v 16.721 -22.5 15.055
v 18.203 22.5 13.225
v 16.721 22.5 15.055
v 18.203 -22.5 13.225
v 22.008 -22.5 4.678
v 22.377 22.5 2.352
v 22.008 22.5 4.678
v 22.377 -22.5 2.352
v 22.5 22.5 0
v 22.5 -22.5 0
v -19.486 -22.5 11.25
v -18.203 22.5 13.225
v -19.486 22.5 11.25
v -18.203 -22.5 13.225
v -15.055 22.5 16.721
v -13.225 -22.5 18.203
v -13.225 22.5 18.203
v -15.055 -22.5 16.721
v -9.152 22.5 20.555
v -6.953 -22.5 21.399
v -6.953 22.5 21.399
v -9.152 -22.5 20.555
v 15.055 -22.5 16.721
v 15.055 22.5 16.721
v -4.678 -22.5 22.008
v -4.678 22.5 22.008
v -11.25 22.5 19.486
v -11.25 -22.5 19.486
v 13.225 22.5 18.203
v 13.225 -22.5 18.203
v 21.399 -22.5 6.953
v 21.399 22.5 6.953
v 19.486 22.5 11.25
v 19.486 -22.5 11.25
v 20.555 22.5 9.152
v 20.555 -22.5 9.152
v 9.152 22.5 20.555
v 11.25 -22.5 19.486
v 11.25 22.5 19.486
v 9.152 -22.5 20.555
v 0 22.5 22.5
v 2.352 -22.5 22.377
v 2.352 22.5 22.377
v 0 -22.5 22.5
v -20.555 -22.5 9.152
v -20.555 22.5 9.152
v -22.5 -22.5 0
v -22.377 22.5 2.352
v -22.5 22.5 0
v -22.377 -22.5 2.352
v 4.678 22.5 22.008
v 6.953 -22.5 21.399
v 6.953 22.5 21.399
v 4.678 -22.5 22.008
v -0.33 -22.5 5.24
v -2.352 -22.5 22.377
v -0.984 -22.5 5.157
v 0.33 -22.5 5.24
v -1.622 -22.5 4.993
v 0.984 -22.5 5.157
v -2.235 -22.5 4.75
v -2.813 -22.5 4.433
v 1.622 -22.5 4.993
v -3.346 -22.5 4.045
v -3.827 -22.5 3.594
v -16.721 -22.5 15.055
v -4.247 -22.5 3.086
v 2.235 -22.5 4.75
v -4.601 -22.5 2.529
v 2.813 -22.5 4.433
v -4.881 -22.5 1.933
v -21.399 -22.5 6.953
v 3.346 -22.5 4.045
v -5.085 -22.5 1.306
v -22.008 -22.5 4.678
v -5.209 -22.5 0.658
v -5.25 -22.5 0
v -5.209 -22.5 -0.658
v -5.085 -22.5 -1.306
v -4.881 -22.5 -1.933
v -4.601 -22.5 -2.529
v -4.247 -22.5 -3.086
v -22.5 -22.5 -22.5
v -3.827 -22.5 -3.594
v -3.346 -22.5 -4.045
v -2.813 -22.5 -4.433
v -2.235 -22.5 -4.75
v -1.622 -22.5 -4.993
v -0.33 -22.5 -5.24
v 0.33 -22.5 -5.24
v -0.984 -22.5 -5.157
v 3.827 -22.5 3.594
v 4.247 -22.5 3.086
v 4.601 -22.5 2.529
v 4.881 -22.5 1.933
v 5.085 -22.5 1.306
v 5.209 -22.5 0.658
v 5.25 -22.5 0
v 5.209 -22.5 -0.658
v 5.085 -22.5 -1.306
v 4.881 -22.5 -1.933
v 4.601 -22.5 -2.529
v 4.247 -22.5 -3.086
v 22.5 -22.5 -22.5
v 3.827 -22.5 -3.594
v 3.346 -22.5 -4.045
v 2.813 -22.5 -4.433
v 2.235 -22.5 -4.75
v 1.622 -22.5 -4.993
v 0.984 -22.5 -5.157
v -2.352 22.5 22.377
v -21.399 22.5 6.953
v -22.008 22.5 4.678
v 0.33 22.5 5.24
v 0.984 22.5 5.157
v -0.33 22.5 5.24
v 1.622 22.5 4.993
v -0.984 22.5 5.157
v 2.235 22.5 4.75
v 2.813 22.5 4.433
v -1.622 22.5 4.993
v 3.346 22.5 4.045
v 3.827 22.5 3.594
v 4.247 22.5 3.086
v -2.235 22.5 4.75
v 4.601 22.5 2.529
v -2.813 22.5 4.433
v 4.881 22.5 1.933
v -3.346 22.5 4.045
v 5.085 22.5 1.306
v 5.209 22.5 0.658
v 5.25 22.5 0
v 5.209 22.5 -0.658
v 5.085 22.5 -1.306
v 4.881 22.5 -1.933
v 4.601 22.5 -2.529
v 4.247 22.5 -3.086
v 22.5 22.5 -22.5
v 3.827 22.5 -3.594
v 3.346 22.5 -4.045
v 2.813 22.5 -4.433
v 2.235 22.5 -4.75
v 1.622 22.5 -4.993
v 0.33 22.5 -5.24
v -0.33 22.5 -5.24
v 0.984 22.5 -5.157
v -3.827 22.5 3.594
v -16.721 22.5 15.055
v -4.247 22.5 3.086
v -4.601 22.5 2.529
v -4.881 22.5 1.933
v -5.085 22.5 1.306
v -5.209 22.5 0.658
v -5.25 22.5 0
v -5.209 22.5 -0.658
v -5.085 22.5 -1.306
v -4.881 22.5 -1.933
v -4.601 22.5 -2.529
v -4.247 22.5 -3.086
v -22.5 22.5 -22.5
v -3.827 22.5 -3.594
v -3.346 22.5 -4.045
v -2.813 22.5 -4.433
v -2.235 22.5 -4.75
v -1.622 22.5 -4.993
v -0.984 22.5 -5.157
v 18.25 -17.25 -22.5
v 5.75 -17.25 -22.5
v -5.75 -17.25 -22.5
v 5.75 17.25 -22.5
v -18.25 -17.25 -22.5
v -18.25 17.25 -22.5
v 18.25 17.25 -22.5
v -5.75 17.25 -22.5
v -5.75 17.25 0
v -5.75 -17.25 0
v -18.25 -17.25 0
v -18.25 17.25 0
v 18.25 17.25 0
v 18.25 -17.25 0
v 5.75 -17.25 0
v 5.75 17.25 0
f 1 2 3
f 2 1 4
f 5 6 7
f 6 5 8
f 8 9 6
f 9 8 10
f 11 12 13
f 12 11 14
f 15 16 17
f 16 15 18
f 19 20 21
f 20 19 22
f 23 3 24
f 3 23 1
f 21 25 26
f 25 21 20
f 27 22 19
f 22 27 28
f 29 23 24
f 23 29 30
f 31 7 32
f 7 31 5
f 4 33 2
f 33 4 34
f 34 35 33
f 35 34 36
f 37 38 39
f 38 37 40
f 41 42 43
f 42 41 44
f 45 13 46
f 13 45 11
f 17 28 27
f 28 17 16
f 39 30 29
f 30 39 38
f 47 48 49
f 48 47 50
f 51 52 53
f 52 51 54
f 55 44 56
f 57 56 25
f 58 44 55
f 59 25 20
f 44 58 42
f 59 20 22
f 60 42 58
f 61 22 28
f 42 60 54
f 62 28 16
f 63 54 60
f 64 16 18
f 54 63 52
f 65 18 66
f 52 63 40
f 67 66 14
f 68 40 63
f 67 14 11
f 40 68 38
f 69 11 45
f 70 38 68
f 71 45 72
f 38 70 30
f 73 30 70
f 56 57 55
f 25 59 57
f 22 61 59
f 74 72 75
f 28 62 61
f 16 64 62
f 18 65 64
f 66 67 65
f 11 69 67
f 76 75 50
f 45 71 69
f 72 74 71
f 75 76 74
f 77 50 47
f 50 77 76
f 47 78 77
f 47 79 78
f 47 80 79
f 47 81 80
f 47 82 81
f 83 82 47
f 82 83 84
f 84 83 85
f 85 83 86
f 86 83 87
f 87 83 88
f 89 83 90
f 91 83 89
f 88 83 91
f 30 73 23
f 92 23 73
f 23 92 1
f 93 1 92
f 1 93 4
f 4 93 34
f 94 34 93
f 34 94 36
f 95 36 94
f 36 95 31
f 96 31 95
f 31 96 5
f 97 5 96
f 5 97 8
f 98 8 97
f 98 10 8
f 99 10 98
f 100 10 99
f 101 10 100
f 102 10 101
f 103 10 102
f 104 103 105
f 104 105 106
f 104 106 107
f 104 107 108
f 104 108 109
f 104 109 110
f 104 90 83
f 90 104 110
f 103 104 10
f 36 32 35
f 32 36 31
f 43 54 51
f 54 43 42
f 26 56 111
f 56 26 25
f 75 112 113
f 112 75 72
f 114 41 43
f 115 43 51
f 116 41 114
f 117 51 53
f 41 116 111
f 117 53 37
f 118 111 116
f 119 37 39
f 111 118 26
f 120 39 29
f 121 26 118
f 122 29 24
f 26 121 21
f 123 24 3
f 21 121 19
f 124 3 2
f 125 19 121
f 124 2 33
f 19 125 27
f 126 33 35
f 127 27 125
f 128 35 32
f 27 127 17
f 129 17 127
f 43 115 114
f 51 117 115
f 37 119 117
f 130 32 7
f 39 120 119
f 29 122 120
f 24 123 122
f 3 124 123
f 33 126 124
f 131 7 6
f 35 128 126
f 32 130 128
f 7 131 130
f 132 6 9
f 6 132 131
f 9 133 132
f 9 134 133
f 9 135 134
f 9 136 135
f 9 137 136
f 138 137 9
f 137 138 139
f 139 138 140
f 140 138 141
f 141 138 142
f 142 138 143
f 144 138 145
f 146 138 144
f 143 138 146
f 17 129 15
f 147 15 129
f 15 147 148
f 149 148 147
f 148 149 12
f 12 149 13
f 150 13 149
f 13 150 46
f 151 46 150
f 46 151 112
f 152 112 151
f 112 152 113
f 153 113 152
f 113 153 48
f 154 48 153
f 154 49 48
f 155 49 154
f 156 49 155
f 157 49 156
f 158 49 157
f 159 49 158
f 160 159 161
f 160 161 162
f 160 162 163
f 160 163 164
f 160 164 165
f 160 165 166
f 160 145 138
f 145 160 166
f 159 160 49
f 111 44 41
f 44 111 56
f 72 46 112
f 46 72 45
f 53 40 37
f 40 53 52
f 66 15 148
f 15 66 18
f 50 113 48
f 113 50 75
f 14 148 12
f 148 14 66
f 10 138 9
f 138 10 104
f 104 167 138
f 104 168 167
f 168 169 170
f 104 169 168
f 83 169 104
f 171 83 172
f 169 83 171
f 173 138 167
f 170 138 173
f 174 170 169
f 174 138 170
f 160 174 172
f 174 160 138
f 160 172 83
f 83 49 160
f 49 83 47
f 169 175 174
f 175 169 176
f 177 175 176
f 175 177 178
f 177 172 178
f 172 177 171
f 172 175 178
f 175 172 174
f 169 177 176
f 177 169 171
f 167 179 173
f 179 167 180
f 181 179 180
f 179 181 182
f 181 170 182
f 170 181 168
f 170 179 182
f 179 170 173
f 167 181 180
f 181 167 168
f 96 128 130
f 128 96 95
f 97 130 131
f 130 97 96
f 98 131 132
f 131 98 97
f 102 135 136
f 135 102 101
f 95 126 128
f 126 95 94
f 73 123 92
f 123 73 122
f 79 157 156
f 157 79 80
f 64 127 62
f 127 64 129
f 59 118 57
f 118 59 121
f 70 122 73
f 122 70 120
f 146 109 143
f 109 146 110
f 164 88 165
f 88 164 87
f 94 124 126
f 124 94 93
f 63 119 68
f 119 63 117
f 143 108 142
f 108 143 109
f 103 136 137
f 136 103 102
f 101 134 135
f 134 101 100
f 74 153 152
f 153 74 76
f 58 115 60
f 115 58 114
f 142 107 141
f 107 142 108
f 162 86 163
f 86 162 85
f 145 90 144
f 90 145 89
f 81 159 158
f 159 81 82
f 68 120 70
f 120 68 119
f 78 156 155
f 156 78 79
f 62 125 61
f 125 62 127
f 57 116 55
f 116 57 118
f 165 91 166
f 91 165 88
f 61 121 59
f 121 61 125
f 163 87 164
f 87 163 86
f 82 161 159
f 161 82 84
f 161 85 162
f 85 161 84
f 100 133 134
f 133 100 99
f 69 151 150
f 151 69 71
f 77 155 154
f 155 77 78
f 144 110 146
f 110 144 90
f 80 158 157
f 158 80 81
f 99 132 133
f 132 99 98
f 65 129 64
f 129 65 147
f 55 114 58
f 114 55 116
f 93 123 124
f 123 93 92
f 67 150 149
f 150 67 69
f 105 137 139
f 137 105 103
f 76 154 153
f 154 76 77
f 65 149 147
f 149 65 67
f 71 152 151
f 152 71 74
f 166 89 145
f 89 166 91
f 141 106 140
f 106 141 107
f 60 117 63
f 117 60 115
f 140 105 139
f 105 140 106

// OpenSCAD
module doubleAxe(l = 600) {
    color("brown") for (x=[-12,12]) translate([x,0,0]) rotate([0,15,0]) translate([0,0,l/2+20]) cube([12,34,l], center=true);
}
    
module pied(ep = 40) {
    difference() {
        translate([50,0,ep/2]) cylinder(d=150, h=ep, $fn=100, center=true);
        for (x=[-10,10]) translate([x,0,0]) rotate([0,15,0]) translate([0,0,ep/2]) cube([8.5,30,ep+10], center=true);
        for (a=[-15,15]) rotate([0,0,a]) translate([80,0,4]) cube([100,30,8.5], center=true);
        for (a=[-15,15]) translate([-300,0,0]) rotate([0,0,a]) translate([350,0,ep/2]) cube([200,75,ep+1], center=true);
    }
    
    color("brown") for (a=[-15,15]) rotate([0,0,a]) translate([180,0,4]) cube([300,30,8], center=true);
}

module support() {
    difference() {
        union() {
            rotate([90,0,0]) cylinder(d=45,h=45,$fn=60,center=true);
            translate([0,0,-45/4]) cube([45,45,45/2], center=true);
        }
        rotate([90,0,0]) cylinder(d=10.5,h=60,$fn=50,center=true);
        for (x=[-12,12]) translate([x,0,-50/2]) cube([12.5,34.5,50],center=true);
    }
}

module tete() {
    difference() {
        union() {
// 2 pattes latérales
            for (y=[-22.6,22.6]) translate([0,y,0]) {
//            for (y=[-20,20]) translate([0,y,0]) {
                hull() {
                    rotate([90,0,0]) cylinder(d=30, h=5, center=true);
                    rotate([0,27,0]) translate([41,0,0]) cube([0.1,5,50], center=true);
                }
            }
// Cone exterieur
            translate([70,0,-50]) cylinder(d1=180, d2=50, h=150, $fn=100, center=true);
// Epaisseur passe-fil
            translate([35,0,0]) rotate([0,23-90,0]) cylinder(d=10, h=3, $fn=20, center=true);
        }
// Cone intérieur
        translate([70,0,-50]) cylinder(d1=178, d2=48, h=150.1, center=true);
// Passage axe M10 
        rotate([90,0,0]) cylinder(d=10.5, h=75, $fn=50, center=true);
// Trou passe-fil
        translate([35,0,0]) rotate([0,23-90,0]) cylinder(d=7, h=7, $fn=20, center=true);
    }

// Support intérieur
    difference() {
        translate([70,0,0]) {
            difference() {
// Epaisseur support douille
                cylinder(d=37.5, h=1,center=true);
// Diamètre douille
                cylinder(d=25, h=8, center=true);
            }
// Support de douille
            for(a=[0:10]) rotate([0,20,a*40]) translate([15+25/2,0,6]) cube([25,12.5,2], center=true);
        }
        translate([70,0,-50]) difference() {
             cylinder(d1=200, d2=70, h=151, center=true);
             cylinder(d1=180, d2=50, h=150, $fn=100, center=true);
        }
    }
}

/*
pied();
doubleAxe(500);
translate([132.5,0,495]) {
    union() {
        support();
        rotate([0,0*(90*sin($t*360)-95),0]) tete();
    }
}
*/

*doubleAxe(500);
/* translate([132.5,0,495]) rotate([0,15,0])*/ support();
